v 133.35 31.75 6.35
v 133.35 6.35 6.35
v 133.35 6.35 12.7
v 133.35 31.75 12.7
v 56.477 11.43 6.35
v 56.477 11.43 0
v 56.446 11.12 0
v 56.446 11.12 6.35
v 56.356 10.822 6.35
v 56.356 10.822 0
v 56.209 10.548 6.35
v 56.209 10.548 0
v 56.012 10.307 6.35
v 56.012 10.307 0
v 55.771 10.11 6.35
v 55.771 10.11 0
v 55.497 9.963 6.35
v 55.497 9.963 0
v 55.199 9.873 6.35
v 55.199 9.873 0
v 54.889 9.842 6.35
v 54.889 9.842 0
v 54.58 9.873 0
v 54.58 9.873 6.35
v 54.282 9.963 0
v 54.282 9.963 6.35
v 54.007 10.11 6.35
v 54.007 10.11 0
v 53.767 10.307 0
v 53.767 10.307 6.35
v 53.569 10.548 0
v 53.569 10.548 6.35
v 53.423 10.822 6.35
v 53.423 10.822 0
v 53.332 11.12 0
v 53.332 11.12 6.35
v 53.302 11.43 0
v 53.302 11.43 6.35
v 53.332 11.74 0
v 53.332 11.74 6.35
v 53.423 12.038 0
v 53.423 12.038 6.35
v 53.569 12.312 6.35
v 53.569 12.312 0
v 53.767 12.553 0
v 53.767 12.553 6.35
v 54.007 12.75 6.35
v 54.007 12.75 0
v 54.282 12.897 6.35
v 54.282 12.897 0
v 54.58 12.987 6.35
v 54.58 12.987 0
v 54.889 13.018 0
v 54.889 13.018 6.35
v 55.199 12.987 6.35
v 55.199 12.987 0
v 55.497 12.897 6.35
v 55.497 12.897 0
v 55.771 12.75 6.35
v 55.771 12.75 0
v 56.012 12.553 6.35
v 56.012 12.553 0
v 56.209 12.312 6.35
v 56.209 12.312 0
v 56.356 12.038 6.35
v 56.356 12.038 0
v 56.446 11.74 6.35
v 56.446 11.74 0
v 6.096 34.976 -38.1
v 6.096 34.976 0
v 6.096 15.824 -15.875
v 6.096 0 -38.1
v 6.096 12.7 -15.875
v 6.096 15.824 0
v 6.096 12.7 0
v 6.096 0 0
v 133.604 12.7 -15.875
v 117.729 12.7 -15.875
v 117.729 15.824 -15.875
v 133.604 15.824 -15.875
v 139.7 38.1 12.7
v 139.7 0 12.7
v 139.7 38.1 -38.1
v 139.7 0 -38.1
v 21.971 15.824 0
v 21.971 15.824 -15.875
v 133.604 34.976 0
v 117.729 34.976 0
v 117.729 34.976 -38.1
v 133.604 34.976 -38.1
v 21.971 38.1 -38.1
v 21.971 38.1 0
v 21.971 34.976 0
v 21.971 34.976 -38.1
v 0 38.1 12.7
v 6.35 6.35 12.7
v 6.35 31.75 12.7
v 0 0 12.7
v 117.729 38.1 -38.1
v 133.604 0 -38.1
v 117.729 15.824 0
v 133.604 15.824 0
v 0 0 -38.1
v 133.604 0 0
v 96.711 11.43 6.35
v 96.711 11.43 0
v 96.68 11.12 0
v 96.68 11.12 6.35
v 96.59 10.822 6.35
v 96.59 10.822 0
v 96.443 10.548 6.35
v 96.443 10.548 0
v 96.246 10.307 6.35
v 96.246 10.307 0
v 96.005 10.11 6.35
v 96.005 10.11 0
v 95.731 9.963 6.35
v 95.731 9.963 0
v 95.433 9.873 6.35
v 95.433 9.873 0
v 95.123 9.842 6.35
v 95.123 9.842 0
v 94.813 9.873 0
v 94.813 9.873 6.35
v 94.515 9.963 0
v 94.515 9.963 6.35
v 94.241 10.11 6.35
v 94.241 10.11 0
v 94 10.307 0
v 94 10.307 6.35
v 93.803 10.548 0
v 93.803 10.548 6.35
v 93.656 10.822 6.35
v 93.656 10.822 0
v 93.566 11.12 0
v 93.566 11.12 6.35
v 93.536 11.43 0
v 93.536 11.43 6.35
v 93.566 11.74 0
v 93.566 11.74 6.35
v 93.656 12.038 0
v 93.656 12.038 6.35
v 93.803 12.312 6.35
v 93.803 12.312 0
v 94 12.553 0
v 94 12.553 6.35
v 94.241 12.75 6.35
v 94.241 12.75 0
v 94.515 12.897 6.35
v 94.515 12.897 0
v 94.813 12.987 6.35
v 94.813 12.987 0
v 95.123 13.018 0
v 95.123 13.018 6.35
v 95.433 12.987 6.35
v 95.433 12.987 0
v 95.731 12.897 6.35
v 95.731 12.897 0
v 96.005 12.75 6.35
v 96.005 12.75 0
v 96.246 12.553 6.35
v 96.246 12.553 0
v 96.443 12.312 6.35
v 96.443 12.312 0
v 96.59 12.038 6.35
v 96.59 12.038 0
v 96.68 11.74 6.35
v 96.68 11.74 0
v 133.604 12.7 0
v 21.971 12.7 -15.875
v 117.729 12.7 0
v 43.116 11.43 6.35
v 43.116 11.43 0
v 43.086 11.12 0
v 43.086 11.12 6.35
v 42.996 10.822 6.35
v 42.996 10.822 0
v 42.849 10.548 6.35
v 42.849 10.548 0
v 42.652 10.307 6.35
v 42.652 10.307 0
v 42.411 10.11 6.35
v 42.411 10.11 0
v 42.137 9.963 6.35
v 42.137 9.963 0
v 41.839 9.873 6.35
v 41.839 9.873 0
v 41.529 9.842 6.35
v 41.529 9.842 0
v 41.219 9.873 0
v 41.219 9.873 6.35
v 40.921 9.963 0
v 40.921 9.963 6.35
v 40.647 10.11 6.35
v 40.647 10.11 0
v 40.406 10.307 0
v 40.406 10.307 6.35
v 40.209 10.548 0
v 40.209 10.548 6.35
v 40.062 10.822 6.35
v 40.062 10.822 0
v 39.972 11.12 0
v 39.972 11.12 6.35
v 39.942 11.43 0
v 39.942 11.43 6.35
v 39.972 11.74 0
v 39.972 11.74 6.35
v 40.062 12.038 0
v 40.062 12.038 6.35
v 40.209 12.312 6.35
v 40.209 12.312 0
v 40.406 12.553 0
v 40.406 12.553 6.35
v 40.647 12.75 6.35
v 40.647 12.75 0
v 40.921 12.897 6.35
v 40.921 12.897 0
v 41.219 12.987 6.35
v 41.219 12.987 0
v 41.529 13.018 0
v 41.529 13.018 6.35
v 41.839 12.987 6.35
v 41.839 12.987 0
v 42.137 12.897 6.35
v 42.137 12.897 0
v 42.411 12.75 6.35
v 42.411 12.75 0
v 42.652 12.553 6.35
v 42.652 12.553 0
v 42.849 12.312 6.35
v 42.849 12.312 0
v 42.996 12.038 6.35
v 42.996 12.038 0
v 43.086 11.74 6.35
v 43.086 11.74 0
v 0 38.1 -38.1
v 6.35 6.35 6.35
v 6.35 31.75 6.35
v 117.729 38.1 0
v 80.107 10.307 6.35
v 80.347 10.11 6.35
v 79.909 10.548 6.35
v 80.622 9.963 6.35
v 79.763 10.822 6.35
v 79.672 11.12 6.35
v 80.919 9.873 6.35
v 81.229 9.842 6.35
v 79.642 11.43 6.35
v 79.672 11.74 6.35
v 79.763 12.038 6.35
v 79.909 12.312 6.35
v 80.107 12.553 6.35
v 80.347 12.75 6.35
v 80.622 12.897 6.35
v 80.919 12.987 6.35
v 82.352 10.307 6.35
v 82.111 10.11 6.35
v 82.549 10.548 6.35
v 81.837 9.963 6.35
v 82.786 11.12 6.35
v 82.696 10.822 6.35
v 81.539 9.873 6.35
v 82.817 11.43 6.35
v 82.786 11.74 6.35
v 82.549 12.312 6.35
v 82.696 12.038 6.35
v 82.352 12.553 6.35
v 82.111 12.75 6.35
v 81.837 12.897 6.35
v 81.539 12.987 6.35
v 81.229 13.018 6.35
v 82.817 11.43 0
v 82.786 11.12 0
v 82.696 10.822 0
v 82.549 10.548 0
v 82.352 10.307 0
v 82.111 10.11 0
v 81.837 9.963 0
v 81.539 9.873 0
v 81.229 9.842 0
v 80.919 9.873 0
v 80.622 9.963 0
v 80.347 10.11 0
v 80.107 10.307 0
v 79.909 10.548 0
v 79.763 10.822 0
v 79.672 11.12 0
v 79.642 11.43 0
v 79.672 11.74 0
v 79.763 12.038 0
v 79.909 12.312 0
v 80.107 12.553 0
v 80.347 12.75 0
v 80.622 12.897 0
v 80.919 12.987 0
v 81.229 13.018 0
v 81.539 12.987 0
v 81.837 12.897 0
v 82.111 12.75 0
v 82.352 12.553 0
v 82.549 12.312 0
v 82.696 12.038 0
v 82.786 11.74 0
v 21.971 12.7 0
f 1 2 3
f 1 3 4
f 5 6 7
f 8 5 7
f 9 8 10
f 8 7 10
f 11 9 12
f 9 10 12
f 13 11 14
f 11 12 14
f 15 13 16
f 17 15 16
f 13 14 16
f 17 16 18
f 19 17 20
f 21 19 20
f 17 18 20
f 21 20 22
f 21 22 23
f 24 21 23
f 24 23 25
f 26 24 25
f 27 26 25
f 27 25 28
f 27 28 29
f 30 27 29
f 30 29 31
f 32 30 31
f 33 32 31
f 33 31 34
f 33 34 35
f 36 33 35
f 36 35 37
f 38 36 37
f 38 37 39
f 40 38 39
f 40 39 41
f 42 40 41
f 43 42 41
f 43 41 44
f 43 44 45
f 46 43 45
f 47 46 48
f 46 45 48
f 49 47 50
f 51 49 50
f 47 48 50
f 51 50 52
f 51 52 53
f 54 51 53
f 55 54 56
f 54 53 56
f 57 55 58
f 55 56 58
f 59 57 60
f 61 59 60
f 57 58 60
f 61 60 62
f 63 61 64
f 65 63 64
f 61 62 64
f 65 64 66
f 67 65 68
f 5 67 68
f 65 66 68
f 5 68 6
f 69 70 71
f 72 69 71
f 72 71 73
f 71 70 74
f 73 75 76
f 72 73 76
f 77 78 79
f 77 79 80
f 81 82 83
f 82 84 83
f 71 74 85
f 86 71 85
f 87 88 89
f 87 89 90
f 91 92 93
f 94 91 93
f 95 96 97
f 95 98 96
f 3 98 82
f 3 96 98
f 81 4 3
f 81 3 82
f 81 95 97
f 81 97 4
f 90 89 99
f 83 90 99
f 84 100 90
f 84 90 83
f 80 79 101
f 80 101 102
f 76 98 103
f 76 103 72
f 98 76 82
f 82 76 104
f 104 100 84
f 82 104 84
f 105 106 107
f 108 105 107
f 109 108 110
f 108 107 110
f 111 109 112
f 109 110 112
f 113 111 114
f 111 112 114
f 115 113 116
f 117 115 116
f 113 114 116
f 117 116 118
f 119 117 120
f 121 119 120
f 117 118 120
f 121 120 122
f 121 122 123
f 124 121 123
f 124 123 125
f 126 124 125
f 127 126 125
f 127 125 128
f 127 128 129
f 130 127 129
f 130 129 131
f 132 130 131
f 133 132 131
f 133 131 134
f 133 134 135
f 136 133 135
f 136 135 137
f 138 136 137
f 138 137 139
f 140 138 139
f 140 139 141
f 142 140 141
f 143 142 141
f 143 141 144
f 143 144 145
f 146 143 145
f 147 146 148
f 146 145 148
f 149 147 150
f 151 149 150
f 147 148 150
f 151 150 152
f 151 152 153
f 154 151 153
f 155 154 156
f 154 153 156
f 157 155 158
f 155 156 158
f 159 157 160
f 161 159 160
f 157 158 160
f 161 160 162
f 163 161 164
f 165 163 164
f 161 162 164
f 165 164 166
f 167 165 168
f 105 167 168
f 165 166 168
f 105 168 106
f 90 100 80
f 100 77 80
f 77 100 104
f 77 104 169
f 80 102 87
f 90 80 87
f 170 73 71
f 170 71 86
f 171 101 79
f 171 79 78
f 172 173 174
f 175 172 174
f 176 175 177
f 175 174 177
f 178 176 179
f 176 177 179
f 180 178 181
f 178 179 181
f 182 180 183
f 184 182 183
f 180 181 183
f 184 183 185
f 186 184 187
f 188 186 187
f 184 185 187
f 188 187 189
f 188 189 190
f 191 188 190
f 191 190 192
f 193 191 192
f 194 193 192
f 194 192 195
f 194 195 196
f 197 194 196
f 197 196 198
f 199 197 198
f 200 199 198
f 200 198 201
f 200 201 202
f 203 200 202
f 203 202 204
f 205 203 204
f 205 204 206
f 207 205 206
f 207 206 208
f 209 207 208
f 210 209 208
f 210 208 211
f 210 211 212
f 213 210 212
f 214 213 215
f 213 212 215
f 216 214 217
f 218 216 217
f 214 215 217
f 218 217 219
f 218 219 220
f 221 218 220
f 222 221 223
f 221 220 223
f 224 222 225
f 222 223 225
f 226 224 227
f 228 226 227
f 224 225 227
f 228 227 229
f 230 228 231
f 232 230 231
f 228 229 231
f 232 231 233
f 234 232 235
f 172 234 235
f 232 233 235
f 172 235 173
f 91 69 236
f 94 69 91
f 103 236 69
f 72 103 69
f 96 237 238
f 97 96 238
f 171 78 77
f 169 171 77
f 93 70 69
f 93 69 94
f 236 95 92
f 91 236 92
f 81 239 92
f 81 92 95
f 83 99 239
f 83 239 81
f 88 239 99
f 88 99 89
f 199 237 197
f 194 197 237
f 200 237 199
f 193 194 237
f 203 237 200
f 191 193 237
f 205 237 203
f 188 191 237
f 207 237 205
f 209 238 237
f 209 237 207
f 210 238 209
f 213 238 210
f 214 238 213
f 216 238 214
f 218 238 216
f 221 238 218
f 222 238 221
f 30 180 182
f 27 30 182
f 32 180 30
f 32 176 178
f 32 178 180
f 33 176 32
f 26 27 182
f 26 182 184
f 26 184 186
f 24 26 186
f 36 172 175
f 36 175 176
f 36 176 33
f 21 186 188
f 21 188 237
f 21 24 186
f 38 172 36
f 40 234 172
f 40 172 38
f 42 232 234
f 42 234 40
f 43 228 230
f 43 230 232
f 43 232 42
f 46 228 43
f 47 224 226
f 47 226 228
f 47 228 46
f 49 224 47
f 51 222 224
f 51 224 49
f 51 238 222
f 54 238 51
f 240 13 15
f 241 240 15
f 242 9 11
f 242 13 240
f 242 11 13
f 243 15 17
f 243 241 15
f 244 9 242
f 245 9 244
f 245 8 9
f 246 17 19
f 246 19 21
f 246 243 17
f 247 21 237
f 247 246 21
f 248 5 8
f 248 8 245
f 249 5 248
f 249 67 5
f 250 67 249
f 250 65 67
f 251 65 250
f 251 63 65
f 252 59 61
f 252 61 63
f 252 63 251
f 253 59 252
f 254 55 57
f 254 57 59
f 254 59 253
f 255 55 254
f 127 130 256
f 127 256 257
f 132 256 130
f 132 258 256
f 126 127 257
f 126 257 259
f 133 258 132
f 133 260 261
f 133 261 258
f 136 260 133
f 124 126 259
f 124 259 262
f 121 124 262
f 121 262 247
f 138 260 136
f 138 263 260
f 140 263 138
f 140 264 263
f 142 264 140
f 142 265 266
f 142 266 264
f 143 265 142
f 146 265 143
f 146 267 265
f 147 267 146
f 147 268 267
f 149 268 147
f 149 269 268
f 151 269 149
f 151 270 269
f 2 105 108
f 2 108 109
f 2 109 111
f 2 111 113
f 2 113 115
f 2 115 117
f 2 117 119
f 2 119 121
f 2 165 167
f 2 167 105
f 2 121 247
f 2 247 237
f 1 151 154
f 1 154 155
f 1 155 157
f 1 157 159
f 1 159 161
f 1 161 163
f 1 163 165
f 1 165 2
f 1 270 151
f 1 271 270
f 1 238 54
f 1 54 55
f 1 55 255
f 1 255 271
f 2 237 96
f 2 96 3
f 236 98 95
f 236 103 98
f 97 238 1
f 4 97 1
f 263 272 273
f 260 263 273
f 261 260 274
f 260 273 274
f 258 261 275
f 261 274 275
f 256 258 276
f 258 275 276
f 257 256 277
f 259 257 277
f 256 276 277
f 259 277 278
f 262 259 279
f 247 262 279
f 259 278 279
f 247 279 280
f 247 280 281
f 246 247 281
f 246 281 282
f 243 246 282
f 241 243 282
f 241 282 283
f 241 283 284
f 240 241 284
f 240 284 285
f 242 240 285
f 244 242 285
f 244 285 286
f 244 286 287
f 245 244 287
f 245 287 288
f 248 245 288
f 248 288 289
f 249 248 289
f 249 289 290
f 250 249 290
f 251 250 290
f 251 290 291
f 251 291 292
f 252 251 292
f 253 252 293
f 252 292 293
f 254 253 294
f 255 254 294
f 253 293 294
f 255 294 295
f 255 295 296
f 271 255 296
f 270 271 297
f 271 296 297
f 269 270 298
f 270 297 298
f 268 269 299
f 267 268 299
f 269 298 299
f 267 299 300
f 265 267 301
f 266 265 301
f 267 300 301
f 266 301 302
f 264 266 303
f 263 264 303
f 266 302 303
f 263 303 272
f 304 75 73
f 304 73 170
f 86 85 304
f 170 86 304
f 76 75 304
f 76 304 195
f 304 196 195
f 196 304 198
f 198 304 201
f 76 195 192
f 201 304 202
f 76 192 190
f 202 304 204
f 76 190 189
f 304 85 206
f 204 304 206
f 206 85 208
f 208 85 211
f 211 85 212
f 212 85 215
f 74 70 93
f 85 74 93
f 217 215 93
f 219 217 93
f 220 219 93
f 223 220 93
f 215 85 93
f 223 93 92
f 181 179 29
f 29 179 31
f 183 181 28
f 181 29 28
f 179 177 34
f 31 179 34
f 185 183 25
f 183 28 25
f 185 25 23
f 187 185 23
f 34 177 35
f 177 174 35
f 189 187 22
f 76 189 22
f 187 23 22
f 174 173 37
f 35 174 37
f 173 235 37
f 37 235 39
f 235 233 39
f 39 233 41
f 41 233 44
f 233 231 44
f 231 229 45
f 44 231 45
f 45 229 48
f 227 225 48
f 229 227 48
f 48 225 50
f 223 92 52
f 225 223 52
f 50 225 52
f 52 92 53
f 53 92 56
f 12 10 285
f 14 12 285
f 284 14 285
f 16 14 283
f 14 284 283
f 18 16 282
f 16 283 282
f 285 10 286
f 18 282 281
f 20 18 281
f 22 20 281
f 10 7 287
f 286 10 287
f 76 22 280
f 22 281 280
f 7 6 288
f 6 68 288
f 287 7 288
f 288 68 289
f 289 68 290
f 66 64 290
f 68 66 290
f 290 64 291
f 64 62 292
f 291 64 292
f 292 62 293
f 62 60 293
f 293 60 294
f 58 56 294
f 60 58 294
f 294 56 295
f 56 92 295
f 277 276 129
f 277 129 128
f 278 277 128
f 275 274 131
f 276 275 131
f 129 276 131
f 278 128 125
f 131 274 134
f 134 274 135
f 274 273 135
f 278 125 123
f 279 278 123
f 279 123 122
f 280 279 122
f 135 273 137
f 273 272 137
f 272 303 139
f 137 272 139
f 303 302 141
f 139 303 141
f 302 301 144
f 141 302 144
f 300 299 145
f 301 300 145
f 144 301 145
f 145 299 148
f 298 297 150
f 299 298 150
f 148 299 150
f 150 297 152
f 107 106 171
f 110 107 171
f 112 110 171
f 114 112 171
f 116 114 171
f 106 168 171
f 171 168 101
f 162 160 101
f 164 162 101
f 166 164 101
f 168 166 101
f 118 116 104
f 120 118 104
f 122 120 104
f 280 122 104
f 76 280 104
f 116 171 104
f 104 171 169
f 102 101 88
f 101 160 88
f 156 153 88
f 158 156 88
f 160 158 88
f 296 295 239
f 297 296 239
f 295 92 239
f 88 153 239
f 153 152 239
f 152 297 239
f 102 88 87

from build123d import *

# Parameters (mm, degrees)
F0_W     = 139.7
F0_H     = 38.1
F1_DEPTH = 6.35
F2_W     = 15.875
F2_H     = 3.1242
F3_DEPTH = 38.1
F4_DEPTH = 15.875
F5_DEPTH = 15.875
F6_W     = 139.7
F6_H     = 38.1
F6_W_2   = 127
F6_H_2   = 25.4
F7_DEPTH = 6.35
F8_R     = 1.5875
F9_DEPTH = 25.4


with BuildPart() as f1:
    # F0 (on Top) → F1 (new body)
    with BuildSketch(Plane.XY):
        with Locations((69.85, 19.05)):
            Rectangle(F0_W, F0_H)
    extrude(amount=F1_DEPTH)

    # F2 (on face) → F3 (join)
    with BuildSketch(Plane(origin=(0, 0, 0), x_dir=(1, 0, 0), z_dir=(0, 0, -1))):
        with Locations((14.0335, -36.5379)):
            Rectangle(F2_W, F2_H)
        Polygon((6.096, 0), (0, 0), (0, -38.1), (6.096, -38.1), (6.096, -34.9758), (6.096, -15.8242), (6.096, -12.7), (6.096, -3.1242), align=None)
        with Locations((125.6665, -36.5379)):
            Rectangle(F2_W, F2_H)
        Polygon((139.7, 0), (133.604, 0), (133.604, -12.7), (133.604, -15.8242), (133.604, -34.9758), (133.604, -38.1), (139.7, -38.1), align=None)
    extrude(amount=F3_DEPTH)

    # F2 (on face) → F4 (join)
    with BuildSketch(Plane(origin=(0, 0, 0), x_dir=(1, 0, 0), z_dir=(0, 0, -1))):
        with Locations((14.0335, -14.2621)):
            Rectangle(F2_W, F2_H)
    extrude(amount=F4_DEPTH)

    # F2 (on face) → F5 (join)
    with BuildSketch(Plane(origin=(0, 0, 0), x_dir=(1, 0, 0), z_dir=(0, 0, -1))):
        with Locations((125.6665, -14.2621)):
            Rectangle(F2_W, F2_H)
    extrude(amount=F5_DEPTH)

    # F6 (on face) → F7 (join)
    with BuildSketch(Plane.XY.offset(6.35)):
        with Locations((69.85, 19.05)):
            Rectangle(F6_W, F6_H)
        with Locations((69.85, 19.05)):
            Rectangle(F6_W_2, F6_H_2, mode=Mode.SUBTRACT)
    extrude(amount=F7_DEPTH)

    # F8 (on face) → F9 (cut)
    with BuildSketch(Plane(origin=(0, 0, 0), x_dir=(1, 0, 0), z_dir=(0, 0, -1))):
        with Locations((41.529, -11.43)):
            Circle(F8_R)
        with Locations((54.8894, -11.43)):
            Circle(F8_R)
        with Locations((81.2292, -11.43)):
            Circle(F8_R)
        with Locations((95.123, -11.43)):
            Circle(F8_R)
    extrude(amount=-F9_DEPTH, mode=Mode.SUBTRACT)


solid = f1.part
